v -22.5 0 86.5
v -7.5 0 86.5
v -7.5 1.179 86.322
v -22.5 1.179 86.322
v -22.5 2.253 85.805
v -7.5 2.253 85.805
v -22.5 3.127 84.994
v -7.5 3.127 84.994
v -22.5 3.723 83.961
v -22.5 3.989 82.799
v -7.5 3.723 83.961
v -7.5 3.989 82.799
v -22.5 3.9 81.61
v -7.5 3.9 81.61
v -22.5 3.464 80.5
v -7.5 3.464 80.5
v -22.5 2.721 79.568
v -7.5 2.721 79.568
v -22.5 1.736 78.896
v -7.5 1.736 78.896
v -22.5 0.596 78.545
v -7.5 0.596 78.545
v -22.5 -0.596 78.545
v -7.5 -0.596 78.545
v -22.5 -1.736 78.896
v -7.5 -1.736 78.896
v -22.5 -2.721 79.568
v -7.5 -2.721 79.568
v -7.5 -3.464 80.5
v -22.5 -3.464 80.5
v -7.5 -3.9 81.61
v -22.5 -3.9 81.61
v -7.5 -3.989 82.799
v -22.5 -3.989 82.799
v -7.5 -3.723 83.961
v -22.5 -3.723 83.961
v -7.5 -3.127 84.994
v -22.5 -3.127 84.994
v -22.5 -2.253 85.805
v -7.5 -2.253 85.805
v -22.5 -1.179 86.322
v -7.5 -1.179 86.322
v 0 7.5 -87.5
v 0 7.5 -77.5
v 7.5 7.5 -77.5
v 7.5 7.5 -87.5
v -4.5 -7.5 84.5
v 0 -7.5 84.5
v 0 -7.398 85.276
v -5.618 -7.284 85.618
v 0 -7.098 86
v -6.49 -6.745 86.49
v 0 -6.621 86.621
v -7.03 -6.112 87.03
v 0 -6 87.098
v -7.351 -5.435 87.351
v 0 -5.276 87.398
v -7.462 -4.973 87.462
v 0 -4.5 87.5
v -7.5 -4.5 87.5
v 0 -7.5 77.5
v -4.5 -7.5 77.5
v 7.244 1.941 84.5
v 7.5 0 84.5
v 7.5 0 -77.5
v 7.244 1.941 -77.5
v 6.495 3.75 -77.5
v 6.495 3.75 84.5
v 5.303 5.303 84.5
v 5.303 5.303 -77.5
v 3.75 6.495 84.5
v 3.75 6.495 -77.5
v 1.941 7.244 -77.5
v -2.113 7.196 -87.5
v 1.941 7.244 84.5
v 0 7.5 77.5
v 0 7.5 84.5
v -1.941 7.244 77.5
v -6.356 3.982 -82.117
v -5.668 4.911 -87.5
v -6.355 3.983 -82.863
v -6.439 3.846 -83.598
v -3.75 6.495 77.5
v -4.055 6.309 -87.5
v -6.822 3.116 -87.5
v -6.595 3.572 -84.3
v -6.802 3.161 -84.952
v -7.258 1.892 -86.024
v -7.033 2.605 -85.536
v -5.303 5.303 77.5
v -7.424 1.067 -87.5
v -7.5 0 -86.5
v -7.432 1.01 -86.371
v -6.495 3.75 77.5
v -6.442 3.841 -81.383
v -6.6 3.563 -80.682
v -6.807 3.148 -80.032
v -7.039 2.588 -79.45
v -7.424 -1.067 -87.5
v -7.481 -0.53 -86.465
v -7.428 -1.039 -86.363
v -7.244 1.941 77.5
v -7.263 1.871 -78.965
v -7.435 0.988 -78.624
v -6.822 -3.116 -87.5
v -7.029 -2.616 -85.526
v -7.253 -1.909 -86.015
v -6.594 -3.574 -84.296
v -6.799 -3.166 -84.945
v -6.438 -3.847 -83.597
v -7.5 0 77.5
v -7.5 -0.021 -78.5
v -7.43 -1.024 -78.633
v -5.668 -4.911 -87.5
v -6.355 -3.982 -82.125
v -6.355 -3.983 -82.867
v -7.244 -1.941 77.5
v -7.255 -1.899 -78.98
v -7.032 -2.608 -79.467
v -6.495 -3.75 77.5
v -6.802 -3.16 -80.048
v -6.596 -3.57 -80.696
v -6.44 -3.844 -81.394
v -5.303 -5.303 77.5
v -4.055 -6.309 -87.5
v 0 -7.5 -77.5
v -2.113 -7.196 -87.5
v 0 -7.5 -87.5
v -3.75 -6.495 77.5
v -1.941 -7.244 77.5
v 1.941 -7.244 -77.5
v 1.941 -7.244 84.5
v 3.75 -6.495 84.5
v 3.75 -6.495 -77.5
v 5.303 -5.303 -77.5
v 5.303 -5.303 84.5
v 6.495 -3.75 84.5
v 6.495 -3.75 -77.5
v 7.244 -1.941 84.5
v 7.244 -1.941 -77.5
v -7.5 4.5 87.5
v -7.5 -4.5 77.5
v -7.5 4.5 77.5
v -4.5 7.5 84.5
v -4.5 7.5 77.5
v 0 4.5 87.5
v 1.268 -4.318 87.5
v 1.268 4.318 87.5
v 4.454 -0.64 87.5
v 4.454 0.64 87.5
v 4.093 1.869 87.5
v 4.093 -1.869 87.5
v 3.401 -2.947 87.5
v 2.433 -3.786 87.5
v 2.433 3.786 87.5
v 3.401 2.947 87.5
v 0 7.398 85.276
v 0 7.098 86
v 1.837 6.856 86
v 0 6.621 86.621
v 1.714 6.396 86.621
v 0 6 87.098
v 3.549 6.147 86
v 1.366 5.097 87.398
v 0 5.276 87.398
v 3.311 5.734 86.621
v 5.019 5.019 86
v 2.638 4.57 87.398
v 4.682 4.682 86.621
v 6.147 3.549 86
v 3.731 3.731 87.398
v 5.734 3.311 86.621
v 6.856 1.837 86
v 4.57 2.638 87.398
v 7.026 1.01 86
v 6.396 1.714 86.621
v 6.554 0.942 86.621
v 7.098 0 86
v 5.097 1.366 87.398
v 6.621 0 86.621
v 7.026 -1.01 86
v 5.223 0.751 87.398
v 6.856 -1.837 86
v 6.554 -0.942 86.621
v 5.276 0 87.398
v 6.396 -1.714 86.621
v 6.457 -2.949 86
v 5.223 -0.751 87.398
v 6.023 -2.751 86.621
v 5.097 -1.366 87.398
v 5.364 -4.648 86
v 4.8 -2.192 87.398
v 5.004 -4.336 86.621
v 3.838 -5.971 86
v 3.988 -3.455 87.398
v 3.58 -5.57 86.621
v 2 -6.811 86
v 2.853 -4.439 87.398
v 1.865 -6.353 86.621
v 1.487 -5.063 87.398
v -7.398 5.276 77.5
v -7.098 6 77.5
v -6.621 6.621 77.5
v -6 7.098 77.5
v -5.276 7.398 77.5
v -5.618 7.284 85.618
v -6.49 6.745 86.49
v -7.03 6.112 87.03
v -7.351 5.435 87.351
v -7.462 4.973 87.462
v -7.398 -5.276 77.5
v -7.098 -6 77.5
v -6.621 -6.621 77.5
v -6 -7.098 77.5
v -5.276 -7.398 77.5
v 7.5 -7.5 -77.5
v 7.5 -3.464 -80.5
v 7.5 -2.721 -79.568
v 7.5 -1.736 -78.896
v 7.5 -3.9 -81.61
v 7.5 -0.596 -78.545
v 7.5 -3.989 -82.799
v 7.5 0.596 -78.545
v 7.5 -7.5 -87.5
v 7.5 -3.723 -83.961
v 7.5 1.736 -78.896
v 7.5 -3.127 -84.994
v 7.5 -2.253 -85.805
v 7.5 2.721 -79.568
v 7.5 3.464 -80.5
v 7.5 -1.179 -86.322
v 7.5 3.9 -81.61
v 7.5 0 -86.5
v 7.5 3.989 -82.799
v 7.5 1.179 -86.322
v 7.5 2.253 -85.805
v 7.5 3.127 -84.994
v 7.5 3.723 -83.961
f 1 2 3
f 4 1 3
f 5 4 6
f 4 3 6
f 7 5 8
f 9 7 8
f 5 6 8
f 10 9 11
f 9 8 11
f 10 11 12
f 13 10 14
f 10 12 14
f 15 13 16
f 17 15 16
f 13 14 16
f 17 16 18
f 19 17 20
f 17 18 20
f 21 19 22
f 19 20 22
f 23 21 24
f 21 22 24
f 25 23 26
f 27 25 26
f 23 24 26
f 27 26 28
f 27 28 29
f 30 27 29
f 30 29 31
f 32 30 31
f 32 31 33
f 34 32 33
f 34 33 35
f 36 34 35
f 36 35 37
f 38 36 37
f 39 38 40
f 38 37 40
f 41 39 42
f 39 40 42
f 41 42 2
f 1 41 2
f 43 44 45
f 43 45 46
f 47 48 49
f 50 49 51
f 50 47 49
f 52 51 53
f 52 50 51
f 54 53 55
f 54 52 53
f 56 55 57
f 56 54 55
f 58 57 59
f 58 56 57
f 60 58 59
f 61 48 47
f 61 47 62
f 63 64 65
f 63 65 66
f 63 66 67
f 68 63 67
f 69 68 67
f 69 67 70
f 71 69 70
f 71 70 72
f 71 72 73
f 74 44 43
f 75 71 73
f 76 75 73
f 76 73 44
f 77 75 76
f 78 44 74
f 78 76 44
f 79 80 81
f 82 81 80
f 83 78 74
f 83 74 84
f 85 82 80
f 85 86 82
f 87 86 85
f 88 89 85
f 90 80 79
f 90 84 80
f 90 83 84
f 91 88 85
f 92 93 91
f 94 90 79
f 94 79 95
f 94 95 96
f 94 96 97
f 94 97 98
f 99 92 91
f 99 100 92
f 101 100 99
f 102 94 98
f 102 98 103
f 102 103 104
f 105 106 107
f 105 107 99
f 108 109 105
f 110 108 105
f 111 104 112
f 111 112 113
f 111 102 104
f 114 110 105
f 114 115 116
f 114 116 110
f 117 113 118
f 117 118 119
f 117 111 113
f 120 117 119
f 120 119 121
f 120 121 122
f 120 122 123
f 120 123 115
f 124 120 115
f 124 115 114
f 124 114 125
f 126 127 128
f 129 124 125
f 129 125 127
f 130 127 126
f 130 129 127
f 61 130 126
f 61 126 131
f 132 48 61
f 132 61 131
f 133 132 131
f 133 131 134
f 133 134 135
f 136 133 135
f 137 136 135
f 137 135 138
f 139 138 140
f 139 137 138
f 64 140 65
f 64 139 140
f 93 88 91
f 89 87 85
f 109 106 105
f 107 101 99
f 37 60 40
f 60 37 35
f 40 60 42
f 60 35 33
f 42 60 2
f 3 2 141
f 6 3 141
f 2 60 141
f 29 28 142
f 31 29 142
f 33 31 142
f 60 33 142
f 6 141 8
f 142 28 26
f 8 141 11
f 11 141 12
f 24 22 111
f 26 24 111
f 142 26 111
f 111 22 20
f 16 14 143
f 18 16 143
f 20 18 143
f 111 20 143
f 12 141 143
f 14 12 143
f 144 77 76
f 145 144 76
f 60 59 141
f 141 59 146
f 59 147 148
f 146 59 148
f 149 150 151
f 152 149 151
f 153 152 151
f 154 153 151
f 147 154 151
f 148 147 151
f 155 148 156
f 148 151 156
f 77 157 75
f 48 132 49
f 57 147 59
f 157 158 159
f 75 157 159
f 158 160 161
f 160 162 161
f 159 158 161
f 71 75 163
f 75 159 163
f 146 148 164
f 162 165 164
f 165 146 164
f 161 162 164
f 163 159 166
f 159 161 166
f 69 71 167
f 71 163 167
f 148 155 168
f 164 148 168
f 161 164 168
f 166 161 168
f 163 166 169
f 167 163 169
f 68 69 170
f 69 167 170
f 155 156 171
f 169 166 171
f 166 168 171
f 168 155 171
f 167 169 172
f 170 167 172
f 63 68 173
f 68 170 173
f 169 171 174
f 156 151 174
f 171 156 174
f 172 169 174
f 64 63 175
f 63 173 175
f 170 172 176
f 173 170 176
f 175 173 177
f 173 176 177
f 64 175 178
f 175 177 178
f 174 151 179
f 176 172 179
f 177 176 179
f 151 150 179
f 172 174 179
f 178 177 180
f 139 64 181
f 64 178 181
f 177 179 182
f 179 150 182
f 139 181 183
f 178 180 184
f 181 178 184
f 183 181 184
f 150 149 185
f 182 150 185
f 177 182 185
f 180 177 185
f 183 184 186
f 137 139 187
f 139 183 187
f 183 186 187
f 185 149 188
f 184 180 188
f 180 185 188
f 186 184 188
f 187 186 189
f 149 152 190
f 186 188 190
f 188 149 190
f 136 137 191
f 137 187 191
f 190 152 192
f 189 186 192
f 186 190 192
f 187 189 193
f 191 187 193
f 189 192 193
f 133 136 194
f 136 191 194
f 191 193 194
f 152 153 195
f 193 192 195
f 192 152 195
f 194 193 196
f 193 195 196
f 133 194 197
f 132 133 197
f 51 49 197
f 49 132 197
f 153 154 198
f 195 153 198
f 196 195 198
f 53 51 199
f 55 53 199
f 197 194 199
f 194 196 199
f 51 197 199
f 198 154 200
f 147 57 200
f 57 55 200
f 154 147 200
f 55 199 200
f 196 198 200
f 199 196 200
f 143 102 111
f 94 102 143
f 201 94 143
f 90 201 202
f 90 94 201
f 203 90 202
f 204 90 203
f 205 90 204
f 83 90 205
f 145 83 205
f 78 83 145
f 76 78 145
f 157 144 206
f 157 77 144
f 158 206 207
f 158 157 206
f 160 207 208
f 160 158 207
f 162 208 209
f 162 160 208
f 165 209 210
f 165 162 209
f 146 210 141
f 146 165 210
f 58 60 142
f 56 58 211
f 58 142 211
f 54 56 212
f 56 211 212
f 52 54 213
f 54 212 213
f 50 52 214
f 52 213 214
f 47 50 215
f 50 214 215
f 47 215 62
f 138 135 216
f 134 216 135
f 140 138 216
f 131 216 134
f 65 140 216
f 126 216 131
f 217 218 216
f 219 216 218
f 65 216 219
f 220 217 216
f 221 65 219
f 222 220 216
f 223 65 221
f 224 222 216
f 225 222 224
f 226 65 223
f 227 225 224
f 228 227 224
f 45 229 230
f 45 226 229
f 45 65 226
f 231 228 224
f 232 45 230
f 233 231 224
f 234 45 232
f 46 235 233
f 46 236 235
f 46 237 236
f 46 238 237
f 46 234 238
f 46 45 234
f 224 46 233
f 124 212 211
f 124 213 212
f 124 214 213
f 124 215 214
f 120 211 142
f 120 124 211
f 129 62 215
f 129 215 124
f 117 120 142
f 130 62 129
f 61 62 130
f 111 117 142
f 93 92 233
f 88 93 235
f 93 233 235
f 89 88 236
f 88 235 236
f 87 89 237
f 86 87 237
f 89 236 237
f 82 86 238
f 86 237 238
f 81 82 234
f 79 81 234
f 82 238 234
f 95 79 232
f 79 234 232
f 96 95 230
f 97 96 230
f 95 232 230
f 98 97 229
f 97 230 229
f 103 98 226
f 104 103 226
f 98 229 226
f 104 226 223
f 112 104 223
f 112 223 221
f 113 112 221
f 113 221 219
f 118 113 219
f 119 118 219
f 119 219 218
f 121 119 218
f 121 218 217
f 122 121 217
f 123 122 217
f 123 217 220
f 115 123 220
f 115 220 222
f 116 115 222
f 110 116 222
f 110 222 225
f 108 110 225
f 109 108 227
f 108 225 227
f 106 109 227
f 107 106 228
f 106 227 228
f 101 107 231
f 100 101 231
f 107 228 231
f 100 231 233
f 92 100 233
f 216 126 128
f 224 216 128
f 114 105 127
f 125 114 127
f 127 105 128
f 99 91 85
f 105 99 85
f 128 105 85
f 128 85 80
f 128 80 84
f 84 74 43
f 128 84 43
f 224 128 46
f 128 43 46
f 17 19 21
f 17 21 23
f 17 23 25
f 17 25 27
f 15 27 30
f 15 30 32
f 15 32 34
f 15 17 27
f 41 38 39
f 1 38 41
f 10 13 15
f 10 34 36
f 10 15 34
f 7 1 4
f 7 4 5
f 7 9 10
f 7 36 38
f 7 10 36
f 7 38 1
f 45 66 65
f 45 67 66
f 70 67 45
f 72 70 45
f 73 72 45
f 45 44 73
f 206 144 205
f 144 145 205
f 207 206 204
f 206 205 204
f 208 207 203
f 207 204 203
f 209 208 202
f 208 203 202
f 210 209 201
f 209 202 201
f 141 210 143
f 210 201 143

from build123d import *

# Parameters (mm, degrees)
SKETCH_1_R          = 7.5
EXTRUDE_1_DEPTH     = 87.5
SKETCH_2_W          = 10
SKETCH_2_H          = 15
EXTRUDE_2_DEPTH     = 7.5
SKETCH_3_R          = 4
EXTRUDE_3_DEPTH     = 15
SKETCH_4_W          = 10
SKETCH_4_H          = 15
EXTRUDE_4_DEPTH     = 7.5
SKETCH_5_R          = 4
CUT_EXTRUDE_1_DEPTH = 15
FILLET_1_R          = 3


with BuildPart() as part:
    # 草图1 → 凸台-拉伸1 (new, symmetric)
    with BuildSketch(Plane.XY):
        Circle(SKETCH_1_R)
    extrude(amount=EXTRUDE_1_DEPTH, both=True)

    # 草图2 → 凸台-拉伸2 (add)
    with BuildSketch(Plane(origin=(0, 0, 0), x_dir=(0, 0, -1), z_dir=(1, 0, 0))):
        with Locations((-82.5, 0)):
            Rectangle(SKETCH_2_W, SKETCH_2_H)
    extrude(amount=-EXTRUDE_2_DEPTH)

    # 草图3 → 凸台-拉伸3 (add)
    with BuildSketch(Plane.ZY.offset(7.5)):
        with Locations((82.5, 0)):
            Circle(SKETCH_3_R)
    extrude(amount=EXTRUDE_3_DEPTH)

    # 草图4 → 凸台-拉伸4 (add)
    with BuildSketch(Plane(origin=(0, 0, 0), x_dir=(0, 0, -1), z_dir=(1, 0, 0))):
        with Locations((82.5, 0)):
            Rectangle(SKETCH_4_W, SKETCH_4_H)
    extrude(amount=EXTRUDE_4_DEPTH)

    # 草图5 → 切除-拉伸1 (cut)
    with BuildSketch(Plane(origin=(7.5, 0, 0), x_dir=(0, 0, -1), z_dir=(1, 0, 0))):
        with Locations((82.5, 0)):
            Circle(SKETCH_5_R)
    extrude(amount=-CUT_EXTRUDE_1_DEPTH, mode=Mode.SUBTRACT)

    # 圆角1
    fillet_1_edges = [part.edges().sort_by_distance(p)[0] for p in [
        (-3.75, -7.5, 87.5),
        (-7.5, 7.5, 82.5),
        (-3.75, 7.5, 87.5),
        (-7.5, -7.5, 82.5),
        (5.303300859, -5.303300859, 87.5),
    ]]
    fillet(fillet_1_edges, radius=FILLET_1_R)


solid = part.part
